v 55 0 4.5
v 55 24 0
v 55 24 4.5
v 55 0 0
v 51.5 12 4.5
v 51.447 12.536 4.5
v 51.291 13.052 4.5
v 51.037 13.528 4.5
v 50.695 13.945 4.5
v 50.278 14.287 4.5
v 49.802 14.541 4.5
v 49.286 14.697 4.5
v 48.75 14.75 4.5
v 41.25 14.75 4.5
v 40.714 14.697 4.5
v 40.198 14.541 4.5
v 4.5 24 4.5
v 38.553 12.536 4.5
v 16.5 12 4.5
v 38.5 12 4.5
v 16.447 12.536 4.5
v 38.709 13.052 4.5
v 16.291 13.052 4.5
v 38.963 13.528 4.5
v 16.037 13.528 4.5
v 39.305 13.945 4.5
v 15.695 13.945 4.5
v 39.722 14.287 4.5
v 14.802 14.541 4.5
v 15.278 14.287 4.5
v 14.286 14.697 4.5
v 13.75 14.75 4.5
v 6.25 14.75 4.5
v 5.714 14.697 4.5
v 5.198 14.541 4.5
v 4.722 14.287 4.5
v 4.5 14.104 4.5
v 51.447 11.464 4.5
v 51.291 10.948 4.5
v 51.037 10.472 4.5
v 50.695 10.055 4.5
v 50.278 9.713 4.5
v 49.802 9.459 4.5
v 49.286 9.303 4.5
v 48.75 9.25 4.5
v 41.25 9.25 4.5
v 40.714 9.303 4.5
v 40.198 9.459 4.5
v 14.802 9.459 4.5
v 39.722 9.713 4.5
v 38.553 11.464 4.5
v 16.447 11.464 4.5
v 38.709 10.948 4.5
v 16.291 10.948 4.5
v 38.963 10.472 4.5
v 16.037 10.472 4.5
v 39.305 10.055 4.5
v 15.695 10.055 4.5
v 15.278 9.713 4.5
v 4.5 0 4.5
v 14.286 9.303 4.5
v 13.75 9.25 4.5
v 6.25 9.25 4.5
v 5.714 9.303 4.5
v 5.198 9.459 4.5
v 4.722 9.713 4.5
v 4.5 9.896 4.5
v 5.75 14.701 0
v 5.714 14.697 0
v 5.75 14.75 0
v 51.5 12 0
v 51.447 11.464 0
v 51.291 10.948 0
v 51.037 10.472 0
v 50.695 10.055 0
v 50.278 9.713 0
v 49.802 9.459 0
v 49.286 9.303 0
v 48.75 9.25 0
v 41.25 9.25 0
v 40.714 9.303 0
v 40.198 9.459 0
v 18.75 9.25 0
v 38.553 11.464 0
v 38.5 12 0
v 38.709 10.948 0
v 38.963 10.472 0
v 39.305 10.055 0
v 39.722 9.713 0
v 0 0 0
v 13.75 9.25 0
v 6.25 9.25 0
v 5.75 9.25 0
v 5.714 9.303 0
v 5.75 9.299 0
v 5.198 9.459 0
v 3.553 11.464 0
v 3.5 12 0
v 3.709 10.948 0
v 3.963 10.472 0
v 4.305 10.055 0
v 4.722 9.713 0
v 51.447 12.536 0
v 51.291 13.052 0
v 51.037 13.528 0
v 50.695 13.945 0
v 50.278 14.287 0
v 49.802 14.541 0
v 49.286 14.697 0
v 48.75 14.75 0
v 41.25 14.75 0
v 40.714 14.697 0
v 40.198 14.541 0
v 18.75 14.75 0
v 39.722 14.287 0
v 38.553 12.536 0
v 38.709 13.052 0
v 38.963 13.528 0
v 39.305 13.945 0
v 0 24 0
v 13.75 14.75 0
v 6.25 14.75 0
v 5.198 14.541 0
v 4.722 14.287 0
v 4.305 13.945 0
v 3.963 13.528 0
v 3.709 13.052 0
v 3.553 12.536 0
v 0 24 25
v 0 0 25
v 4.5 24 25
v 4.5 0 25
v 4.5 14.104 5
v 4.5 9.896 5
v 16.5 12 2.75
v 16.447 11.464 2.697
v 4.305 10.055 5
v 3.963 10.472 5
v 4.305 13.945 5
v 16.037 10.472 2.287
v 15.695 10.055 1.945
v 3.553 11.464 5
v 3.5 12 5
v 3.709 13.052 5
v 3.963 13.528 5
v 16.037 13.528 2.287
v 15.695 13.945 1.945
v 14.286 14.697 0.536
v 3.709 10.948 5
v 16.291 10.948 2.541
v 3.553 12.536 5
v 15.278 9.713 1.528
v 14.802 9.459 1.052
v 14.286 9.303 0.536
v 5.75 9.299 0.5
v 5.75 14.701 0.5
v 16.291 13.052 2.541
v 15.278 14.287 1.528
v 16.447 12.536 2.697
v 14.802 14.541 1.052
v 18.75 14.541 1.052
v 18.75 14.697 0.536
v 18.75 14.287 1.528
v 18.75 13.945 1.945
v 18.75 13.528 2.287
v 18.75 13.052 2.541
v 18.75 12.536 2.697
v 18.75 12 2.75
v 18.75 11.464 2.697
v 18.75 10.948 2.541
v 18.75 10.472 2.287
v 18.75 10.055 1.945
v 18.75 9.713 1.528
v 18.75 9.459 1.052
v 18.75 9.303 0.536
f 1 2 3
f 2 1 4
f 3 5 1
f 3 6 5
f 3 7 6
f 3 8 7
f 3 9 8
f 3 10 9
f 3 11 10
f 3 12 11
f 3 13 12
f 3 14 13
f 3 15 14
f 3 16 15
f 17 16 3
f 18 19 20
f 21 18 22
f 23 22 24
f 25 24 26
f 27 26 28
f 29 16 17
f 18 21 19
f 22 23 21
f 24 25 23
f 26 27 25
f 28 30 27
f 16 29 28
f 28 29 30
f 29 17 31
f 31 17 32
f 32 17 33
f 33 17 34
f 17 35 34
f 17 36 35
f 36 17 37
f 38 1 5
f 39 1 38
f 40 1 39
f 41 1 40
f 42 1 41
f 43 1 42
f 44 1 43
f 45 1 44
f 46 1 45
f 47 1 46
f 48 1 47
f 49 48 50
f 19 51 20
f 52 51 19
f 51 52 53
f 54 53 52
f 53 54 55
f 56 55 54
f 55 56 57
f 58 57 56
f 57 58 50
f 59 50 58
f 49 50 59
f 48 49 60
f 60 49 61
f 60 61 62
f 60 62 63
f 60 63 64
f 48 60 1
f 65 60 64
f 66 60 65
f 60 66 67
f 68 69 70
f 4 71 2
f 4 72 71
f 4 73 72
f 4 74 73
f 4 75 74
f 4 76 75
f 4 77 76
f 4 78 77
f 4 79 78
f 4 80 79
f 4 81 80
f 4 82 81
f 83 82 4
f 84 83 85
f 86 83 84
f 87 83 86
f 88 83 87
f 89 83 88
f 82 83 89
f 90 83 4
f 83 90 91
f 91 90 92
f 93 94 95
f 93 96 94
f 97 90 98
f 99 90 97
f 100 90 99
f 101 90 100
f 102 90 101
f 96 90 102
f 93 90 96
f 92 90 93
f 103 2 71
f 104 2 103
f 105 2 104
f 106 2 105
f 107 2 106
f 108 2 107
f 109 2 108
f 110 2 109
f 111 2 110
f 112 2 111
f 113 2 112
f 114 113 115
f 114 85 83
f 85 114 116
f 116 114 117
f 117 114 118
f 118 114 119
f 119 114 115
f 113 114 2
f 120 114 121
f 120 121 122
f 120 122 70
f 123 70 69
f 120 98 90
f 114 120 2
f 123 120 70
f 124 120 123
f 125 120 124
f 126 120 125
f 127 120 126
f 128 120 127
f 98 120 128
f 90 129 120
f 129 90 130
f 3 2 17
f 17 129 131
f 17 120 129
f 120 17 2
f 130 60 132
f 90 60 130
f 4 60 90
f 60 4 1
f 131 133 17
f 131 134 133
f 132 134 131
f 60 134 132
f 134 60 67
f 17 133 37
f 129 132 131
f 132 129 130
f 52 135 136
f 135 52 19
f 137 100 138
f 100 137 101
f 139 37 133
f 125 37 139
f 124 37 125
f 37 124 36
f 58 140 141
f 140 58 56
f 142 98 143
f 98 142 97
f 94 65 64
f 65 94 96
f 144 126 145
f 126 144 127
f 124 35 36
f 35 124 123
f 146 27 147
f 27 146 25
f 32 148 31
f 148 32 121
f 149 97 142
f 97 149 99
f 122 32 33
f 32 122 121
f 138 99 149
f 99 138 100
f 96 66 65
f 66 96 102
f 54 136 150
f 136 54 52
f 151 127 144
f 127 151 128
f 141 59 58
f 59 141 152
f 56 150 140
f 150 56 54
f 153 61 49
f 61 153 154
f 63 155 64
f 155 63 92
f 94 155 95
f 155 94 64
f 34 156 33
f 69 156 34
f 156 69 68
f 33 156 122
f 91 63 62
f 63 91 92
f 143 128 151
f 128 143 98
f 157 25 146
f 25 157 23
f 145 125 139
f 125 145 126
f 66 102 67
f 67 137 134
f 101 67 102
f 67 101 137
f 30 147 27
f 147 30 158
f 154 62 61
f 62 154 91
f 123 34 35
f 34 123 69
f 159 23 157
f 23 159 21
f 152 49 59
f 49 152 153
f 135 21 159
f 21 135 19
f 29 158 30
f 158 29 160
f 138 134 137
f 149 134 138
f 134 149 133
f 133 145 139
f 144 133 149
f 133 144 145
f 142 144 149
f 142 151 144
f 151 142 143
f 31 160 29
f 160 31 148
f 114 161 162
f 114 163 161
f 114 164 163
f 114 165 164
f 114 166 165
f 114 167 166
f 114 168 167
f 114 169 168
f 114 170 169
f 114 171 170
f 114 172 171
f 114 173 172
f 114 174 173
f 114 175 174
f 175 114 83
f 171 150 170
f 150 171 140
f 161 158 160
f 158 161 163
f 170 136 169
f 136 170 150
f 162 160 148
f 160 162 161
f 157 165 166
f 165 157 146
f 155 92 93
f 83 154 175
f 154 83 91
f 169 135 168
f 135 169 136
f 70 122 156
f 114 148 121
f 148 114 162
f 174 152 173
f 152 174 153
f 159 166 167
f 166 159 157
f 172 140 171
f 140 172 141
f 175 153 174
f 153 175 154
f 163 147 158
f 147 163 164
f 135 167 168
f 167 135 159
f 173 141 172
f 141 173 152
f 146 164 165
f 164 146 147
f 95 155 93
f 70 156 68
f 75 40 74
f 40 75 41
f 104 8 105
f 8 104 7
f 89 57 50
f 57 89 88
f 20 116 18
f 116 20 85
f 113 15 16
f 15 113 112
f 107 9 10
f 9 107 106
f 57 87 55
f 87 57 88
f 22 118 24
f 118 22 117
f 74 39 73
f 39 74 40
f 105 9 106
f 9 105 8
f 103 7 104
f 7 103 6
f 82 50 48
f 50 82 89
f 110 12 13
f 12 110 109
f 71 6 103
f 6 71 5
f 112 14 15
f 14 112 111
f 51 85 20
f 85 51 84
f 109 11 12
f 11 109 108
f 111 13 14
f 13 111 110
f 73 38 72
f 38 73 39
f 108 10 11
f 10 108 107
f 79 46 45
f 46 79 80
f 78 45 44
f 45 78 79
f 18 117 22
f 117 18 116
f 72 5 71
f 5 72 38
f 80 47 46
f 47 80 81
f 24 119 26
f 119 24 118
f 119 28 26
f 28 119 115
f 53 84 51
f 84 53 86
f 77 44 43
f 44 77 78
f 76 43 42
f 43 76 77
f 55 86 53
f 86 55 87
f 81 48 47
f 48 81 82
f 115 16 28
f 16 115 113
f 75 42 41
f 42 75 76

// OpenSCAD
$fn = 32;

// ----------------------------------------------------------------------
// L-bracket: 55 x 24 x 25 mm
// ----------------------------------------------------------------------

// --- parameters (mm) ---
arm_x = 55;               // horizontal leg, X
arm_z = 25;               // vertical leg, Z
width = 24;               // bracket depth, Y
wall = 4.5;               // plate thickness
hole_d = 4.5;             // clearance for M4
slot_w = 5.5;             // euro screw slot width
slot_l = 13;              // euro screw slot length

module hole_z(px, py) {
  translate([px, py, -0.5]) cylinder(h = wall + 1, d = hole_d);
}
module hole_x(pz, py) {
  translate([-0.5, py, pz]) rotate([0, 90, 0]) cylinder(h = wall + 1, d = hole_d);
}
module euro_slot_z(px, py) {
  hull() {
    translate([px - (slot_l - slot_w) / 2, py, -0.5]) cylinder(h = wall + 1, d = slot_w);
    translate([px + (slot_l - slot_w) / 2, py, -0.5]) cylinder(h = wall + 1, d = slot_w);
  }
}
module euro_slot_x(pz, py) {
  translate([-0.5, 0, 0]) rotate([0, 90, 0]) hull() {
    translate([0, py, pz - (slot_l - slot_w) / 2]) cylinder(h = wall + 1, d = slot_w);
    translate([0, py, pz + (slot_l - slot_w) / 2]) cylinder(h = wall + 1, d = slot_w);
  }
}

difference() {
  union() {
    /* horizontal leg */
    cube([arm_x, width, wall]);
    /* vertical leg, overlapping the corner block */
    cube([wall, width, arm_z]);
  }
  euro_slot_z(10, 12);
  euro_slot_x(10, 12);
  euro_slot_z(45, 12);
}
